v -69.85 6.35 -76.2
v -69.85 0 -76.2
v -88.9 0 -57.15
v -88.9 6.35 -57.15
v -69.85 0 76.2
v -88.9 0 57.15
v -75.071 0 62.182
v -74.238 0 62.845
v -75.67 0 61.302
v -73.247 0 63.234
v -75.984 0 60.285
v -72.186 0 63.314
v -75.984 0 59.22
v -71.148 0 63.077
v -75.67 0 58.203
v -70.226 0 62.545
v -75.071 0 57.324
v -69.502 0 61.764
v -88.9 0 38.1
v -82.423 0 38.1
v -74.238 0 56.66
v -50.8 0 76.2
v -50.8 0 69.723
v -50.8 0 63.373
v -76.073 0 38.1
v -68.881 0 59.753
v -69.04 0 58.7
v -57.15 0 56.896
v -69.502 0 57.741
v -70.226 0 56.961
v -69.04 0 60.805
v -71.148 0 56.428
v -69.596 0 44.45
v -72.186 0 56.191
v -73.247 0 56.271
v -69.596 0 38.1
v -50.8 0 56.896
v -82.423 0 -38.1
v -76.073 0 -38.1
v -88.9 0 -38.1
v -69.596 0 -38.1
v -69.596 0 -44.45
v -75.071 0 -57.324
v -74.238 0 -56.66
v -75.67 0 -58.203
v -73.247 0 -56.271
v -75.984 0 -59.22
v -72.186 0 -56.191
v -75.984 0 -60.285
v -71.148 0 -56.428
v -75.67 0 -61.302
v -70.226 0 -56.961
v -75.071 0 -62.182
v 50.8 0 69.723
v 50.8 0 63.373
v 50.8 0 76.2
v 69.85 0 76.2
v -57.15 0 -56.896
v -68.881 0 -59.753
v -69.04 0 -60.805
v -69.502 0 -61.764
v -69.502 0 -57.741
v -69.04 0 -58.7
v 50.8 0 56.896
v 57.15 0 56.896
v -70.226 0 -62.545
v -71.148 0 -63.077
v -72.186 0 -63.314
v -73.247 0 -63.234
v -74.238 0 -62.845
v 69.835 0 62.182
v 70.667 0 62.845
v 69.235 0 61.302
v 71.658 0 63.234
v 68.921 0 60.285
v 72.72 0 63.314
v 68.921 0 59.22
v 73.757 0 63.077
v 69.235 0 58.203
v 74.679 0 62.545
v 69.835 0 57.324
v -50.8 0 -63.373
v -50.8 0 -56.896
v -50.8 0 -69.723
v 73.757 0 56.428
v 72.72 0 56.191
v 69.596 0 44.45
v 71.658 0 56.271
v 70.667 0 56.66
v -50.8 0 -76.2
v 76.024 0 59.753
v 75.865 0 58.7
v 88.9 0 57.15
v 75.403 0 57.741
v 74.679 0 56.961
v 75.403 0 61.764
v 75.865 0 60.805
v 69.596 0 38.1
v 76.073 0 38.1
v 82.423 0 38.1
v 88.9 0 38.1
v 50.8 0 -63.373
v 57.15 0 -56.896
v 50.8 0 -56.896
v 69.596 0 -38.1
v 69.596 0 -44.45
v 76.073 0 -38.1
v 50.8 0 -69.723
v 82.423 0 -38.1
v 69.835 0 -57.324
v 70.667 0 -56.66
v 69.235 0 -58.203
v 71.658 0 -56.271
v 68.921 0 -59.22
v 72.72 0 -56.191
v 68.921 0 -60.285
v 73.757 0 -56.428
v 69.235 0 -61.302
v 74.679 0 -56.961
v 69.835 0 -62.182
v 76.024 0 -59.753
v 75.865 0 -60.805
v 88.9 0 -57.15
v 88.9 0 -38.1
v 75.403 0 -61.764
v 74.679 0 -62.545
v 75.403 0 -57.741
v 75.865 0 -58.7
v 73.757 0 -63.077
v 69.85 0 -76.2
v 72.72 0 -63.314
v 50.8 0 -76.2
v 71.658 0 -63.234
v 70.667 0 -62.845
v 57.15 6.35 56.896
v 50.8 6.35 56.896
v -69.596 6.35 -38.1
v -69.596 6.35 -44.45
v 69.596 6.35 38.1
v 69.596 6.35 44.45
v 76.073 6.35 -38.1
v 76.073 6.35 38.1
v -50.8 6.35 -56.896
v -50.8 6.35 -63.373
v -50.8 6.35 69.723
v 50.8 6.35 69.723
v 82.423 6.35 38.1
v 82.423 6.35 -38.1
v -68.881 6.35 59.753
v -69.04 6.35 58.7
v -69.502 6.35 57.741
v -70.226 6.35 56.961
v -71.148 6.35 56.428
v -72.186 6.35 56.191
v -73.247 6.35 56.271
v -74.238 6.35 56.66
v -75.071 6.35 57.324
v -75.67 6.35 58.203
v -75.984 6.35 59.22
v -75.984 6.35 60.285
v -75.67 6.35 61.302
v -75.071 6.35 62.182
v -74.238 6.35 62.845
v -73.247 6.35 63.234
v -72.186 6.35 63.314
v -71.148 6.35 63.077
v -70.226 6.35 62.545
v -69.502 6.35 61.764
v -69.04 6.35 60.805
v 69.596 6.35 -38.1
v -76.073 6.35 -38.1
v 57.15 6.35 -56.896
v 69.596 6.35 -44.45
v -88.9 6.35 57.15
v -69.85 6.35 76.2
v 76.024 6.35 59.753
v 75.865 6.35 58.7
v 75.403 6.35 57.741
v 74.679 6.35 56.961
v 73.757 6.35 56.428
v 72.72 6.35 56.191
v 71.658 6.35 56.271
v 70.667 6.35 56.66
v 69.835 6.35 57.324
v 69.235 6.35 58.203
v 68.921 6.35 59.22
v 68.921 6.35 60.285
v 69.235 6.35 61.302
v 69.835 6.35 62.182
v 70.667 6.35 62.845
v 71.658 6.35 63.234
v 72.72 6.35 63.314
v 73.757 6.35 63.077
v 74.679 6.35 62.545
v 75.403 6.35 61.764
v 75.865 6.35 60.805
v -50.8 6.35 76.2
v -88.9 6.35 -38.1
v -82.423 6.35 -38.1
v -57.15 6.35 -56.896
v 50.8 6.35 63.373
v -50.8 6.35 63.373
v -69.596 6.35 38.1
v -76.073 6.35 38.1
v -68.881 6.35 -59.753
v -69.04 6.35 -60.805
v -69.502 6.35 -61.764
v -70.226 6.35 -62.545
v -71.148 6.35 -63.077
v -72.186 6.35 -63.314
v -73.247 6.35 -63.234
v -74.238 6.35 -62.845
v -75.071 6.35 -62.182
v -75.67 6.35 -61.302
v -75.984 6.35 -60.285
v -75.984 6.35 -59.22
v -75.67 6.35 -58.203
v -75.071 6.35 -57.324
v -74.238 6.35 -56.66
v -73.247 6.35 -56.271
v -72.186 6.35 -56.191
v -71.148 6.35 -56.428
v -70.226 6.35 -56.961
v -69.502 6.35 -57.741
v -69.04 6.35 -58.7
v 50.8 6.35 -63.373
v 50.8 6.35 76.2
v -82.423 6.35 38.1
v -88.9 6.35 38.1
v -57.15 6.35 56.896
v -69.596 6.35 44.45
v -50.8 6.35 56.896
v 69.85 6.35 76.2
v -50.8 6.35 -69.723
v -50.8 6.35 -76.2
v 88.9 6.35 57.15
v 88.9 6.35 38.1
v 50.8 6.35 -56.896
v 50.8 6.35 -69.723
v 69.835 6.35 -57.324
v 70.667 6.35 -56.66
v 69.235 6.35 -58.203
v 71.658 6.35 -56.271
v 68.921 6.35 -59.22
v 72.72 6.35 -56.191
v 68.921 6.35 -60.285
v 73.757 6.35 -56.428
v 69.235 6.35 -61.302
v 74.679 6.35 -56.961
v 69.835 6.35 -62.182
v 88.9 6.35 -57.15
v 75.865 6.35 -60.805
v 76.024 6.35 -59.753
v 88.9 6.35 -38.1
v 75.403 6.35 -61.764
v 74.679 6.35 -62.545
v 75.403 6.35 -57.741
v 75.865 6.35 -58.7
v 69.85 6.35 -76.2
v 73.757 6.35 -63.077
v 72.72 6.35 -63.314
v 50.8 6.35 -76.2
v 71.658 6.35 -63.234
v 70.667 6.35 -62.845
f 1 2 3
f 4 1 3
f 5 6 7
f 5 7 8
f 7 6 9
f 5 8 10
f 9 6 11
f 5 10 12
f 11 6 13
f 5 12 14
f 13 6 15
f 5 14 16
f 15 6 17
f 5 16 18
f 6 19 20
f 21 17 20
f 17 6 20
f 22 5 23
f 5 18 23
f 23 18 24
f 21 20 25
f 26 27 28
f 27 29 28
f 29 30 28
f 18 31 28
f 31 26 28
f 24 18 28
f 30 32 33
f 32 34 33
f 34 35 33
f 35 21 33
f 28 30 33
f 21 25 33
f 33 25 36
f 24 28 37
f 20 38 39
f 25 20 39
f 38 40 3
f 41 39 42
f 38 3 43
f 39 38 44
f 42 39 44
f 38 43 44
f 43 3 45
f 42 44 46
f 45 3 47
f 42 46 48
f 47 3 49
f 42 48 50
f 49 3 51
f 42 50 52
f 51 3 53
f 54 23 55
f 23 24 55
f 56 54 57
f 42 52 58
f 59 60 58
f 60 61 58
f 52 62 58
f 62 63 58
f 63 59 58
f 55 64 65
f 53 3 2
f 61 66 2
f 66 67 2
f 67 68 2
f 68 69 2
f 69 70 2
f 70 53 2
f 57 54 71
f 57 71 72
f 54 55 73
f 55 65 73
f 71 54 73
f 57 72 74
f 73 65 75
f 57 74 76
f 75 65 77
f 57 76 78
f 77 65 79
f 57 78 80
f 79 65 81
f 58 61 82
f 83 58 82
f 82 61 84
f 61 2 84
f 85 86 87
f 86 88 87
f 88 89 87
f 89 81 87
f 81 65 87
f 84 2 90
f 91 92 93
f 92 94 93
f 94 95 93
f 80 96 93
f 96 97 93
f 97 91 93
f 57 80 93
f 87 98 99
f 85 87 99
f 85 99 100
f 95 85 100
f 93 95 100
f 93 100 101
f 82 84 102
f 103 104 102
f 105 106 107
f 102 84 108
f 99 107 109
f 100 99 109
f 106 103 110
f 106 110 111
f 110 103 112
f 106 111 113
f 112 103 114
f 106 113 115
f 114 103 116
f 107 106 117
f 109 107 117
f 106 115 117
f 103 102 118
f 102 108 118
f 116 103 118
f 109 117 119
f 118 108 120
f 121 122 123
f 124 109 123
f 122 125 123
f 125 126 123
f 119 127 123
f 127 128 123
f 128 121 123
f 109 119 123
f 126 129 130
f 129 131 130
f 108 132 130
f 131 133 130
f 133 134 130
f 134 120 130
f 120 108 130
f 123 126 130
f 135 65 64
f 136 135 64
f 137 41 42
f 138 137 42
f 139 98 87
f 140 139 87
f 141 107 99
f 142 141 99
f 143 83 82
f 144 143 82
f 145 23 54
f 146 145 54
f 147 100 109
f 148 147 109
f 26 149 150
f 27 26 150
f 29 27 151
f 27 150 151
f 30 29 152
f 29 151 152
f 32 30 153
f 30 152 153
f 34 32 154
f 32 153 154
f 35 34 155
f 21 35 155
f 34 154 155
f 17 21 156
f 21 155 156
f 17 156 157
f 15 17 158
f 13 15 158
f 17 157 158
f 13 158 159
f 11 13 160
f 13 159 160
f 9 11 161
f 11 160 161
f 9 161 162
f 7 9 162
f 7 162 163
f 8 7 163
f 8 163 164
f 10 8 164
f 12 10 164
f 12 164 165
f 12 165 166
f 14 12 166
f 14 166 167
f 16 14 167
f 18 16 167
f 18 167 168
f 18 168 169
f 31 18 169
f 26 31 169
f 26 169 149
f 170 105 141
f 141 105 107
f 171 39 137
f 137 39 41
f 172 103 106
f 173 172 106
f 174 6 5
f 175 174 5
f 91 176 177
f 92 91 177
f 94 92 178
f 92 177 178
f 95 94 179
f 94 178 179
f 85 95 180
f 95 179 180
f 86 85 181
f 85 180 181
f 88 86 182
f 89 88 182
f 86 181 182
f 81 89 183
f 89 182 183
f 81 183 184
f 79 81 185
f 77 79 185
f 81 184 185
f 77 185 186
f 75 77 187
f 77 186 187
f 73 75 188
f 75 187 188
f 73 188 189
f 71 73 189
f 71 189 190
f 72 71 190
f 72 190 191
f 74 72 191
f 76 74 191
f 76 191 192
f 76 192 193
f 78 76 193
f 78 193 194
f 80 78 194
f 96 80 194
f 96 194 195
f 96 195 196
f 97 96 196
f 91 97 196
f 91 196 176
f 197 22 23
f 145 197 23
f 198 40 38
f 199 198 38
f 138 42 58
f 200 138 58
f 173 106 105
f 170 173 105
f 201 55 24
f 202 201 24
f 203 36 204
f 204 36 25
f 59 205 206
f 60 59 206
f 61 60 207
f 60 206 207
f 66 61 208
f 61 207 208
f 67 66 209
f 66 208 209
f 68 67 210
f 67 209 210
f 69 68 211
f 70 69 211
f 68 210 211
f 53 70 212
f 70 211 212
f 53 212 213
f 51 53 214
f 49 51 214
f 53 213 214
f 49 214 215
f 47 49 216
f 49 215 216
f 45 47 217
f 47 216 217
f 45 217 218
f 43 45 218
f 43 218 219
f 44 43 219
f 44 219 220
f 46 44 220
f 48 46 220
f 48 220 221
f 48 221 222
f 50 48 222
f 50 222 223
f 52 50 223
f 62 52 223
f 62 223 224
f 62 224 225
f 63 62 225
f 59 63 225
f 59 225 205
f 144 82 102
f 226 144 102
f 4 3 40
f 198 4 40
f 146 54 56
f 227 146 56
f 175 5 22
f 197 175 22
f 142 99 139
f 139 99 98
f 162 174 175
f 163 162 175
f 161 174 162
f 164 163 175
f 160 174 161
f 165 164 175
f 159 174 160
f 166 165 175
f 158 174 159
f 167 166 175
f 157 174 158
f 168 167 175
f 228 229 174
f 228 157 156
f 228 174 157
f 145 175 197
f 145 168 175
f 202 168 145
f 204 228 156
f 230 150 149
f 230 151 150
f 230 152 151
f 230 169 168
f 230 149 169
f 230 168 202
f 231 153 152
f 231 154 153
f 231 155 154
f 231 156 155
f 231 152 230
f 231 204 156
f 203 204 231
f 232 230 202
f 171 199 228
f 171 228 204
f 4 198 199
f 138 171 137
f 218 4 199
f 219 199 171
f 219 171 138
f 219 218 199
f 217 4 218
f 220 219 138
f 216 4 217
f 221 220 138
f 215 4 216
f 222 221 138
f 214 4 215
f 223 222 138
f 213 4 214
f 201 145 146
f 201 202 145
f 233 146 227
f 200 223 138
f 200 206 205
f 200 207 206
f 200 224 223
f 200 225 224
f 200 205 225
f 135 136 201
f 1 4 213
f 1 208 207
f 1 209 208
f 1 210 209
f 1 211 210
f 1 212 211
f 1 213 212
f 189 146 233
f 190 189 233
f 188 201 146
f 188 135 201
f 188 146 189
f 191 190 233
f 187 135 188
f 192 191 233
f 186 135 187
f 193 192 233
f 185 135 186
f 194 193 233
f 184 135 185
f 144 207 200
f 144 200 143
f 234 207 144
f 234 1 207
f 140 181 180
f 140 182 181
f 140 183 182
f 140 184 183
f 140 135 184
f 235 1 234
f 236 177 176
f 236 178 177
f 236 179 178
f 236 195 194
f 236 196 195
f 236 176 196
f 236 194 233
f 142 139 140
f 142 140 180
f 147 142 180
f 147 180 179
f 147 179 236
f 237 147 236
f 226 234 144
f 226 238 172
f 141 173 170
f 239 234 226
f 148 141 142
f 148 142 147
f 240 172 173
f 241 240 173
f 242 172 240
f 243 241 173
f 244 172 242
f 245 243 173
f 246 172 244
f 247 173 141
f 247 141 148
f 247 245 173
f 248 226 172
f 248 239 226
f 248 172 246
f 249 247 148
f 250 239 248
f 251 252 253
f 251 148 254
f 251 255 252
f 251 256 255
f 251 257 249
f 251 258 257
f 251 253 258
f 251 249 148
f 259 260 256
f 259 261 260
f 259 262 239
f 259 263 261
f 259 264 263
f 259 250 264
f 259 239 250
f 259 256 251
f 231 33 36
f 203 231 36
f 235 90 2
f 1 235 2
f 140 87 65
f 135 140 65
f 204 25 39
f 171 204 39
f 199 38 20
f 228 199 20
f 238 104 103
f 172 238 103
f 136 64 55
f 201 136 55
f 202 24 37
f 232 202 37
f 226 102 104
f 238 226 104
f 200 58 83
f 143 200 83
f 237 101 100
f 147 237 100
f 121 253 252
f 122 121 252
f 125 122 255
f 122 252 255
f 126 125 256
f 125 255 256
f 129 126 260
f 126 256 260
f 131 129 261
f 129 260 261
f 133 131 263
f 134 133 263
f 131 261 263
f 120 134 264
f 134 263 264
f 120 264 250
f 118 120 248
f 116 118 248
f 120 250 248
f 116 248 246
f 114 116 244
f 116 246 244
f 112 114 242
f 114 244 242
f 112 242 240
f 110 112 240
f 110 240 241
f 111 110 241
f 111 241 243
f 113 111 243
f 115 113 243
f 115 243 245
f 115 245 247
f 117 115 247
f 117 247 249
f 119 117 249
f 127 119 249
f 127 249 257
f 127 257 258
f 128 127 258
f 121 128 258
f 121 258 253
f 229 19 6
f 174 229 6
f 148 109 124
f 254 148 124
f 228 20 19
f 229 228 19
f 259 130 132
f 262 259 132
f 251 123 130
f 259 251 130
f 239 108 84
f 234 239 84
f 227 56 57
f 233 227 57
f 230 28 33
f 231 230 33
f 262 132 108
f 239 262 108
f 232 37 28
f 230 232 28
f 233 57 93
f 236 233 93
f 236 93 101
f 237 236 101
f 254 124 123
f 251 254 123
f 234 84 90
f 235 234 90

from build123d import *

# Parameters (mm, degrees)
BOSS_EXTRUDE1_DEPTH     = 6.35
F_1_4_CLEARANCE_HOLE1_D = 7.14248


with BuildPart() as part:
    # Sketch1 → Boss-Extrude1 (new body)
    with BuildSketch(Plane(origin=(0, 0, 0), x_dir=(1, 0, 0), z_dir=(0, 1, 0))):
        Polygon((-88.9, -38.1), (-88.9, -57.15), (-69.85, -76.2), (-50.8, -76.2), (-50.8, -69.723), (50.8, -69.723), (50.8, -76.2), (69.85, -76.2), (88.9, -57.15), (88.9, -38.1), (82.423, -38.1), (82.423, 38.1), (88.9, 38.1), (88.9, 57.15), (69.85, 76.2), (50.8, 76.2), (50.8, 69.723), (-50.8, 69.723), (-50.8, 76.2), (-69.85, 76.2), (-88.9, 57.15), (-88.9, 38.1), (-82.423, 38.1), (-82.423, -38.1), align=None)
        Polygon((-57.15, -56.896), (-69.596, -44.45), (-69.596, -38.1), (-76.073, -38.1), (-76.073, 38.1), (-69.596, 38.1), (-69.596, 44.45), (-57.15, 56.896), (-50.8, 56.896), (-50.8, 63.373), (50.8, 63.373), (50.8, 56.896), (57.15, 56.896), (69.596, 44.45), (69.596, 38.1), (76.073, 38.1), (76.073, -38.1), (69.596, -38.1), (69.596, -44.45), (57.15, -56.896), (50.8, -56.896), (50.8, -63.373), (-50.8, -63.373), (-50.8, -56.896), align=None, mode=Mode.SUBTRACT)
    extrude(amount=BOSS_EXTRUDE1_DEPTH)

    # 1/4 Clearance Hole1 (through all)
    with Locations(Plane(origin=(0, 0, 0), x_dir=(-1, 0, 0), z_dir=(0, -1, 0))):
        with Locations((-72.452653333, 59.752653333), (72.452653333, 59.752653333), (72.452653333, -59.752653333), (-72.452653333, -59.752653333)):
            Hole(F_1_4_CLEARANCE_HOLE1_D / 2)


solid = part.part
